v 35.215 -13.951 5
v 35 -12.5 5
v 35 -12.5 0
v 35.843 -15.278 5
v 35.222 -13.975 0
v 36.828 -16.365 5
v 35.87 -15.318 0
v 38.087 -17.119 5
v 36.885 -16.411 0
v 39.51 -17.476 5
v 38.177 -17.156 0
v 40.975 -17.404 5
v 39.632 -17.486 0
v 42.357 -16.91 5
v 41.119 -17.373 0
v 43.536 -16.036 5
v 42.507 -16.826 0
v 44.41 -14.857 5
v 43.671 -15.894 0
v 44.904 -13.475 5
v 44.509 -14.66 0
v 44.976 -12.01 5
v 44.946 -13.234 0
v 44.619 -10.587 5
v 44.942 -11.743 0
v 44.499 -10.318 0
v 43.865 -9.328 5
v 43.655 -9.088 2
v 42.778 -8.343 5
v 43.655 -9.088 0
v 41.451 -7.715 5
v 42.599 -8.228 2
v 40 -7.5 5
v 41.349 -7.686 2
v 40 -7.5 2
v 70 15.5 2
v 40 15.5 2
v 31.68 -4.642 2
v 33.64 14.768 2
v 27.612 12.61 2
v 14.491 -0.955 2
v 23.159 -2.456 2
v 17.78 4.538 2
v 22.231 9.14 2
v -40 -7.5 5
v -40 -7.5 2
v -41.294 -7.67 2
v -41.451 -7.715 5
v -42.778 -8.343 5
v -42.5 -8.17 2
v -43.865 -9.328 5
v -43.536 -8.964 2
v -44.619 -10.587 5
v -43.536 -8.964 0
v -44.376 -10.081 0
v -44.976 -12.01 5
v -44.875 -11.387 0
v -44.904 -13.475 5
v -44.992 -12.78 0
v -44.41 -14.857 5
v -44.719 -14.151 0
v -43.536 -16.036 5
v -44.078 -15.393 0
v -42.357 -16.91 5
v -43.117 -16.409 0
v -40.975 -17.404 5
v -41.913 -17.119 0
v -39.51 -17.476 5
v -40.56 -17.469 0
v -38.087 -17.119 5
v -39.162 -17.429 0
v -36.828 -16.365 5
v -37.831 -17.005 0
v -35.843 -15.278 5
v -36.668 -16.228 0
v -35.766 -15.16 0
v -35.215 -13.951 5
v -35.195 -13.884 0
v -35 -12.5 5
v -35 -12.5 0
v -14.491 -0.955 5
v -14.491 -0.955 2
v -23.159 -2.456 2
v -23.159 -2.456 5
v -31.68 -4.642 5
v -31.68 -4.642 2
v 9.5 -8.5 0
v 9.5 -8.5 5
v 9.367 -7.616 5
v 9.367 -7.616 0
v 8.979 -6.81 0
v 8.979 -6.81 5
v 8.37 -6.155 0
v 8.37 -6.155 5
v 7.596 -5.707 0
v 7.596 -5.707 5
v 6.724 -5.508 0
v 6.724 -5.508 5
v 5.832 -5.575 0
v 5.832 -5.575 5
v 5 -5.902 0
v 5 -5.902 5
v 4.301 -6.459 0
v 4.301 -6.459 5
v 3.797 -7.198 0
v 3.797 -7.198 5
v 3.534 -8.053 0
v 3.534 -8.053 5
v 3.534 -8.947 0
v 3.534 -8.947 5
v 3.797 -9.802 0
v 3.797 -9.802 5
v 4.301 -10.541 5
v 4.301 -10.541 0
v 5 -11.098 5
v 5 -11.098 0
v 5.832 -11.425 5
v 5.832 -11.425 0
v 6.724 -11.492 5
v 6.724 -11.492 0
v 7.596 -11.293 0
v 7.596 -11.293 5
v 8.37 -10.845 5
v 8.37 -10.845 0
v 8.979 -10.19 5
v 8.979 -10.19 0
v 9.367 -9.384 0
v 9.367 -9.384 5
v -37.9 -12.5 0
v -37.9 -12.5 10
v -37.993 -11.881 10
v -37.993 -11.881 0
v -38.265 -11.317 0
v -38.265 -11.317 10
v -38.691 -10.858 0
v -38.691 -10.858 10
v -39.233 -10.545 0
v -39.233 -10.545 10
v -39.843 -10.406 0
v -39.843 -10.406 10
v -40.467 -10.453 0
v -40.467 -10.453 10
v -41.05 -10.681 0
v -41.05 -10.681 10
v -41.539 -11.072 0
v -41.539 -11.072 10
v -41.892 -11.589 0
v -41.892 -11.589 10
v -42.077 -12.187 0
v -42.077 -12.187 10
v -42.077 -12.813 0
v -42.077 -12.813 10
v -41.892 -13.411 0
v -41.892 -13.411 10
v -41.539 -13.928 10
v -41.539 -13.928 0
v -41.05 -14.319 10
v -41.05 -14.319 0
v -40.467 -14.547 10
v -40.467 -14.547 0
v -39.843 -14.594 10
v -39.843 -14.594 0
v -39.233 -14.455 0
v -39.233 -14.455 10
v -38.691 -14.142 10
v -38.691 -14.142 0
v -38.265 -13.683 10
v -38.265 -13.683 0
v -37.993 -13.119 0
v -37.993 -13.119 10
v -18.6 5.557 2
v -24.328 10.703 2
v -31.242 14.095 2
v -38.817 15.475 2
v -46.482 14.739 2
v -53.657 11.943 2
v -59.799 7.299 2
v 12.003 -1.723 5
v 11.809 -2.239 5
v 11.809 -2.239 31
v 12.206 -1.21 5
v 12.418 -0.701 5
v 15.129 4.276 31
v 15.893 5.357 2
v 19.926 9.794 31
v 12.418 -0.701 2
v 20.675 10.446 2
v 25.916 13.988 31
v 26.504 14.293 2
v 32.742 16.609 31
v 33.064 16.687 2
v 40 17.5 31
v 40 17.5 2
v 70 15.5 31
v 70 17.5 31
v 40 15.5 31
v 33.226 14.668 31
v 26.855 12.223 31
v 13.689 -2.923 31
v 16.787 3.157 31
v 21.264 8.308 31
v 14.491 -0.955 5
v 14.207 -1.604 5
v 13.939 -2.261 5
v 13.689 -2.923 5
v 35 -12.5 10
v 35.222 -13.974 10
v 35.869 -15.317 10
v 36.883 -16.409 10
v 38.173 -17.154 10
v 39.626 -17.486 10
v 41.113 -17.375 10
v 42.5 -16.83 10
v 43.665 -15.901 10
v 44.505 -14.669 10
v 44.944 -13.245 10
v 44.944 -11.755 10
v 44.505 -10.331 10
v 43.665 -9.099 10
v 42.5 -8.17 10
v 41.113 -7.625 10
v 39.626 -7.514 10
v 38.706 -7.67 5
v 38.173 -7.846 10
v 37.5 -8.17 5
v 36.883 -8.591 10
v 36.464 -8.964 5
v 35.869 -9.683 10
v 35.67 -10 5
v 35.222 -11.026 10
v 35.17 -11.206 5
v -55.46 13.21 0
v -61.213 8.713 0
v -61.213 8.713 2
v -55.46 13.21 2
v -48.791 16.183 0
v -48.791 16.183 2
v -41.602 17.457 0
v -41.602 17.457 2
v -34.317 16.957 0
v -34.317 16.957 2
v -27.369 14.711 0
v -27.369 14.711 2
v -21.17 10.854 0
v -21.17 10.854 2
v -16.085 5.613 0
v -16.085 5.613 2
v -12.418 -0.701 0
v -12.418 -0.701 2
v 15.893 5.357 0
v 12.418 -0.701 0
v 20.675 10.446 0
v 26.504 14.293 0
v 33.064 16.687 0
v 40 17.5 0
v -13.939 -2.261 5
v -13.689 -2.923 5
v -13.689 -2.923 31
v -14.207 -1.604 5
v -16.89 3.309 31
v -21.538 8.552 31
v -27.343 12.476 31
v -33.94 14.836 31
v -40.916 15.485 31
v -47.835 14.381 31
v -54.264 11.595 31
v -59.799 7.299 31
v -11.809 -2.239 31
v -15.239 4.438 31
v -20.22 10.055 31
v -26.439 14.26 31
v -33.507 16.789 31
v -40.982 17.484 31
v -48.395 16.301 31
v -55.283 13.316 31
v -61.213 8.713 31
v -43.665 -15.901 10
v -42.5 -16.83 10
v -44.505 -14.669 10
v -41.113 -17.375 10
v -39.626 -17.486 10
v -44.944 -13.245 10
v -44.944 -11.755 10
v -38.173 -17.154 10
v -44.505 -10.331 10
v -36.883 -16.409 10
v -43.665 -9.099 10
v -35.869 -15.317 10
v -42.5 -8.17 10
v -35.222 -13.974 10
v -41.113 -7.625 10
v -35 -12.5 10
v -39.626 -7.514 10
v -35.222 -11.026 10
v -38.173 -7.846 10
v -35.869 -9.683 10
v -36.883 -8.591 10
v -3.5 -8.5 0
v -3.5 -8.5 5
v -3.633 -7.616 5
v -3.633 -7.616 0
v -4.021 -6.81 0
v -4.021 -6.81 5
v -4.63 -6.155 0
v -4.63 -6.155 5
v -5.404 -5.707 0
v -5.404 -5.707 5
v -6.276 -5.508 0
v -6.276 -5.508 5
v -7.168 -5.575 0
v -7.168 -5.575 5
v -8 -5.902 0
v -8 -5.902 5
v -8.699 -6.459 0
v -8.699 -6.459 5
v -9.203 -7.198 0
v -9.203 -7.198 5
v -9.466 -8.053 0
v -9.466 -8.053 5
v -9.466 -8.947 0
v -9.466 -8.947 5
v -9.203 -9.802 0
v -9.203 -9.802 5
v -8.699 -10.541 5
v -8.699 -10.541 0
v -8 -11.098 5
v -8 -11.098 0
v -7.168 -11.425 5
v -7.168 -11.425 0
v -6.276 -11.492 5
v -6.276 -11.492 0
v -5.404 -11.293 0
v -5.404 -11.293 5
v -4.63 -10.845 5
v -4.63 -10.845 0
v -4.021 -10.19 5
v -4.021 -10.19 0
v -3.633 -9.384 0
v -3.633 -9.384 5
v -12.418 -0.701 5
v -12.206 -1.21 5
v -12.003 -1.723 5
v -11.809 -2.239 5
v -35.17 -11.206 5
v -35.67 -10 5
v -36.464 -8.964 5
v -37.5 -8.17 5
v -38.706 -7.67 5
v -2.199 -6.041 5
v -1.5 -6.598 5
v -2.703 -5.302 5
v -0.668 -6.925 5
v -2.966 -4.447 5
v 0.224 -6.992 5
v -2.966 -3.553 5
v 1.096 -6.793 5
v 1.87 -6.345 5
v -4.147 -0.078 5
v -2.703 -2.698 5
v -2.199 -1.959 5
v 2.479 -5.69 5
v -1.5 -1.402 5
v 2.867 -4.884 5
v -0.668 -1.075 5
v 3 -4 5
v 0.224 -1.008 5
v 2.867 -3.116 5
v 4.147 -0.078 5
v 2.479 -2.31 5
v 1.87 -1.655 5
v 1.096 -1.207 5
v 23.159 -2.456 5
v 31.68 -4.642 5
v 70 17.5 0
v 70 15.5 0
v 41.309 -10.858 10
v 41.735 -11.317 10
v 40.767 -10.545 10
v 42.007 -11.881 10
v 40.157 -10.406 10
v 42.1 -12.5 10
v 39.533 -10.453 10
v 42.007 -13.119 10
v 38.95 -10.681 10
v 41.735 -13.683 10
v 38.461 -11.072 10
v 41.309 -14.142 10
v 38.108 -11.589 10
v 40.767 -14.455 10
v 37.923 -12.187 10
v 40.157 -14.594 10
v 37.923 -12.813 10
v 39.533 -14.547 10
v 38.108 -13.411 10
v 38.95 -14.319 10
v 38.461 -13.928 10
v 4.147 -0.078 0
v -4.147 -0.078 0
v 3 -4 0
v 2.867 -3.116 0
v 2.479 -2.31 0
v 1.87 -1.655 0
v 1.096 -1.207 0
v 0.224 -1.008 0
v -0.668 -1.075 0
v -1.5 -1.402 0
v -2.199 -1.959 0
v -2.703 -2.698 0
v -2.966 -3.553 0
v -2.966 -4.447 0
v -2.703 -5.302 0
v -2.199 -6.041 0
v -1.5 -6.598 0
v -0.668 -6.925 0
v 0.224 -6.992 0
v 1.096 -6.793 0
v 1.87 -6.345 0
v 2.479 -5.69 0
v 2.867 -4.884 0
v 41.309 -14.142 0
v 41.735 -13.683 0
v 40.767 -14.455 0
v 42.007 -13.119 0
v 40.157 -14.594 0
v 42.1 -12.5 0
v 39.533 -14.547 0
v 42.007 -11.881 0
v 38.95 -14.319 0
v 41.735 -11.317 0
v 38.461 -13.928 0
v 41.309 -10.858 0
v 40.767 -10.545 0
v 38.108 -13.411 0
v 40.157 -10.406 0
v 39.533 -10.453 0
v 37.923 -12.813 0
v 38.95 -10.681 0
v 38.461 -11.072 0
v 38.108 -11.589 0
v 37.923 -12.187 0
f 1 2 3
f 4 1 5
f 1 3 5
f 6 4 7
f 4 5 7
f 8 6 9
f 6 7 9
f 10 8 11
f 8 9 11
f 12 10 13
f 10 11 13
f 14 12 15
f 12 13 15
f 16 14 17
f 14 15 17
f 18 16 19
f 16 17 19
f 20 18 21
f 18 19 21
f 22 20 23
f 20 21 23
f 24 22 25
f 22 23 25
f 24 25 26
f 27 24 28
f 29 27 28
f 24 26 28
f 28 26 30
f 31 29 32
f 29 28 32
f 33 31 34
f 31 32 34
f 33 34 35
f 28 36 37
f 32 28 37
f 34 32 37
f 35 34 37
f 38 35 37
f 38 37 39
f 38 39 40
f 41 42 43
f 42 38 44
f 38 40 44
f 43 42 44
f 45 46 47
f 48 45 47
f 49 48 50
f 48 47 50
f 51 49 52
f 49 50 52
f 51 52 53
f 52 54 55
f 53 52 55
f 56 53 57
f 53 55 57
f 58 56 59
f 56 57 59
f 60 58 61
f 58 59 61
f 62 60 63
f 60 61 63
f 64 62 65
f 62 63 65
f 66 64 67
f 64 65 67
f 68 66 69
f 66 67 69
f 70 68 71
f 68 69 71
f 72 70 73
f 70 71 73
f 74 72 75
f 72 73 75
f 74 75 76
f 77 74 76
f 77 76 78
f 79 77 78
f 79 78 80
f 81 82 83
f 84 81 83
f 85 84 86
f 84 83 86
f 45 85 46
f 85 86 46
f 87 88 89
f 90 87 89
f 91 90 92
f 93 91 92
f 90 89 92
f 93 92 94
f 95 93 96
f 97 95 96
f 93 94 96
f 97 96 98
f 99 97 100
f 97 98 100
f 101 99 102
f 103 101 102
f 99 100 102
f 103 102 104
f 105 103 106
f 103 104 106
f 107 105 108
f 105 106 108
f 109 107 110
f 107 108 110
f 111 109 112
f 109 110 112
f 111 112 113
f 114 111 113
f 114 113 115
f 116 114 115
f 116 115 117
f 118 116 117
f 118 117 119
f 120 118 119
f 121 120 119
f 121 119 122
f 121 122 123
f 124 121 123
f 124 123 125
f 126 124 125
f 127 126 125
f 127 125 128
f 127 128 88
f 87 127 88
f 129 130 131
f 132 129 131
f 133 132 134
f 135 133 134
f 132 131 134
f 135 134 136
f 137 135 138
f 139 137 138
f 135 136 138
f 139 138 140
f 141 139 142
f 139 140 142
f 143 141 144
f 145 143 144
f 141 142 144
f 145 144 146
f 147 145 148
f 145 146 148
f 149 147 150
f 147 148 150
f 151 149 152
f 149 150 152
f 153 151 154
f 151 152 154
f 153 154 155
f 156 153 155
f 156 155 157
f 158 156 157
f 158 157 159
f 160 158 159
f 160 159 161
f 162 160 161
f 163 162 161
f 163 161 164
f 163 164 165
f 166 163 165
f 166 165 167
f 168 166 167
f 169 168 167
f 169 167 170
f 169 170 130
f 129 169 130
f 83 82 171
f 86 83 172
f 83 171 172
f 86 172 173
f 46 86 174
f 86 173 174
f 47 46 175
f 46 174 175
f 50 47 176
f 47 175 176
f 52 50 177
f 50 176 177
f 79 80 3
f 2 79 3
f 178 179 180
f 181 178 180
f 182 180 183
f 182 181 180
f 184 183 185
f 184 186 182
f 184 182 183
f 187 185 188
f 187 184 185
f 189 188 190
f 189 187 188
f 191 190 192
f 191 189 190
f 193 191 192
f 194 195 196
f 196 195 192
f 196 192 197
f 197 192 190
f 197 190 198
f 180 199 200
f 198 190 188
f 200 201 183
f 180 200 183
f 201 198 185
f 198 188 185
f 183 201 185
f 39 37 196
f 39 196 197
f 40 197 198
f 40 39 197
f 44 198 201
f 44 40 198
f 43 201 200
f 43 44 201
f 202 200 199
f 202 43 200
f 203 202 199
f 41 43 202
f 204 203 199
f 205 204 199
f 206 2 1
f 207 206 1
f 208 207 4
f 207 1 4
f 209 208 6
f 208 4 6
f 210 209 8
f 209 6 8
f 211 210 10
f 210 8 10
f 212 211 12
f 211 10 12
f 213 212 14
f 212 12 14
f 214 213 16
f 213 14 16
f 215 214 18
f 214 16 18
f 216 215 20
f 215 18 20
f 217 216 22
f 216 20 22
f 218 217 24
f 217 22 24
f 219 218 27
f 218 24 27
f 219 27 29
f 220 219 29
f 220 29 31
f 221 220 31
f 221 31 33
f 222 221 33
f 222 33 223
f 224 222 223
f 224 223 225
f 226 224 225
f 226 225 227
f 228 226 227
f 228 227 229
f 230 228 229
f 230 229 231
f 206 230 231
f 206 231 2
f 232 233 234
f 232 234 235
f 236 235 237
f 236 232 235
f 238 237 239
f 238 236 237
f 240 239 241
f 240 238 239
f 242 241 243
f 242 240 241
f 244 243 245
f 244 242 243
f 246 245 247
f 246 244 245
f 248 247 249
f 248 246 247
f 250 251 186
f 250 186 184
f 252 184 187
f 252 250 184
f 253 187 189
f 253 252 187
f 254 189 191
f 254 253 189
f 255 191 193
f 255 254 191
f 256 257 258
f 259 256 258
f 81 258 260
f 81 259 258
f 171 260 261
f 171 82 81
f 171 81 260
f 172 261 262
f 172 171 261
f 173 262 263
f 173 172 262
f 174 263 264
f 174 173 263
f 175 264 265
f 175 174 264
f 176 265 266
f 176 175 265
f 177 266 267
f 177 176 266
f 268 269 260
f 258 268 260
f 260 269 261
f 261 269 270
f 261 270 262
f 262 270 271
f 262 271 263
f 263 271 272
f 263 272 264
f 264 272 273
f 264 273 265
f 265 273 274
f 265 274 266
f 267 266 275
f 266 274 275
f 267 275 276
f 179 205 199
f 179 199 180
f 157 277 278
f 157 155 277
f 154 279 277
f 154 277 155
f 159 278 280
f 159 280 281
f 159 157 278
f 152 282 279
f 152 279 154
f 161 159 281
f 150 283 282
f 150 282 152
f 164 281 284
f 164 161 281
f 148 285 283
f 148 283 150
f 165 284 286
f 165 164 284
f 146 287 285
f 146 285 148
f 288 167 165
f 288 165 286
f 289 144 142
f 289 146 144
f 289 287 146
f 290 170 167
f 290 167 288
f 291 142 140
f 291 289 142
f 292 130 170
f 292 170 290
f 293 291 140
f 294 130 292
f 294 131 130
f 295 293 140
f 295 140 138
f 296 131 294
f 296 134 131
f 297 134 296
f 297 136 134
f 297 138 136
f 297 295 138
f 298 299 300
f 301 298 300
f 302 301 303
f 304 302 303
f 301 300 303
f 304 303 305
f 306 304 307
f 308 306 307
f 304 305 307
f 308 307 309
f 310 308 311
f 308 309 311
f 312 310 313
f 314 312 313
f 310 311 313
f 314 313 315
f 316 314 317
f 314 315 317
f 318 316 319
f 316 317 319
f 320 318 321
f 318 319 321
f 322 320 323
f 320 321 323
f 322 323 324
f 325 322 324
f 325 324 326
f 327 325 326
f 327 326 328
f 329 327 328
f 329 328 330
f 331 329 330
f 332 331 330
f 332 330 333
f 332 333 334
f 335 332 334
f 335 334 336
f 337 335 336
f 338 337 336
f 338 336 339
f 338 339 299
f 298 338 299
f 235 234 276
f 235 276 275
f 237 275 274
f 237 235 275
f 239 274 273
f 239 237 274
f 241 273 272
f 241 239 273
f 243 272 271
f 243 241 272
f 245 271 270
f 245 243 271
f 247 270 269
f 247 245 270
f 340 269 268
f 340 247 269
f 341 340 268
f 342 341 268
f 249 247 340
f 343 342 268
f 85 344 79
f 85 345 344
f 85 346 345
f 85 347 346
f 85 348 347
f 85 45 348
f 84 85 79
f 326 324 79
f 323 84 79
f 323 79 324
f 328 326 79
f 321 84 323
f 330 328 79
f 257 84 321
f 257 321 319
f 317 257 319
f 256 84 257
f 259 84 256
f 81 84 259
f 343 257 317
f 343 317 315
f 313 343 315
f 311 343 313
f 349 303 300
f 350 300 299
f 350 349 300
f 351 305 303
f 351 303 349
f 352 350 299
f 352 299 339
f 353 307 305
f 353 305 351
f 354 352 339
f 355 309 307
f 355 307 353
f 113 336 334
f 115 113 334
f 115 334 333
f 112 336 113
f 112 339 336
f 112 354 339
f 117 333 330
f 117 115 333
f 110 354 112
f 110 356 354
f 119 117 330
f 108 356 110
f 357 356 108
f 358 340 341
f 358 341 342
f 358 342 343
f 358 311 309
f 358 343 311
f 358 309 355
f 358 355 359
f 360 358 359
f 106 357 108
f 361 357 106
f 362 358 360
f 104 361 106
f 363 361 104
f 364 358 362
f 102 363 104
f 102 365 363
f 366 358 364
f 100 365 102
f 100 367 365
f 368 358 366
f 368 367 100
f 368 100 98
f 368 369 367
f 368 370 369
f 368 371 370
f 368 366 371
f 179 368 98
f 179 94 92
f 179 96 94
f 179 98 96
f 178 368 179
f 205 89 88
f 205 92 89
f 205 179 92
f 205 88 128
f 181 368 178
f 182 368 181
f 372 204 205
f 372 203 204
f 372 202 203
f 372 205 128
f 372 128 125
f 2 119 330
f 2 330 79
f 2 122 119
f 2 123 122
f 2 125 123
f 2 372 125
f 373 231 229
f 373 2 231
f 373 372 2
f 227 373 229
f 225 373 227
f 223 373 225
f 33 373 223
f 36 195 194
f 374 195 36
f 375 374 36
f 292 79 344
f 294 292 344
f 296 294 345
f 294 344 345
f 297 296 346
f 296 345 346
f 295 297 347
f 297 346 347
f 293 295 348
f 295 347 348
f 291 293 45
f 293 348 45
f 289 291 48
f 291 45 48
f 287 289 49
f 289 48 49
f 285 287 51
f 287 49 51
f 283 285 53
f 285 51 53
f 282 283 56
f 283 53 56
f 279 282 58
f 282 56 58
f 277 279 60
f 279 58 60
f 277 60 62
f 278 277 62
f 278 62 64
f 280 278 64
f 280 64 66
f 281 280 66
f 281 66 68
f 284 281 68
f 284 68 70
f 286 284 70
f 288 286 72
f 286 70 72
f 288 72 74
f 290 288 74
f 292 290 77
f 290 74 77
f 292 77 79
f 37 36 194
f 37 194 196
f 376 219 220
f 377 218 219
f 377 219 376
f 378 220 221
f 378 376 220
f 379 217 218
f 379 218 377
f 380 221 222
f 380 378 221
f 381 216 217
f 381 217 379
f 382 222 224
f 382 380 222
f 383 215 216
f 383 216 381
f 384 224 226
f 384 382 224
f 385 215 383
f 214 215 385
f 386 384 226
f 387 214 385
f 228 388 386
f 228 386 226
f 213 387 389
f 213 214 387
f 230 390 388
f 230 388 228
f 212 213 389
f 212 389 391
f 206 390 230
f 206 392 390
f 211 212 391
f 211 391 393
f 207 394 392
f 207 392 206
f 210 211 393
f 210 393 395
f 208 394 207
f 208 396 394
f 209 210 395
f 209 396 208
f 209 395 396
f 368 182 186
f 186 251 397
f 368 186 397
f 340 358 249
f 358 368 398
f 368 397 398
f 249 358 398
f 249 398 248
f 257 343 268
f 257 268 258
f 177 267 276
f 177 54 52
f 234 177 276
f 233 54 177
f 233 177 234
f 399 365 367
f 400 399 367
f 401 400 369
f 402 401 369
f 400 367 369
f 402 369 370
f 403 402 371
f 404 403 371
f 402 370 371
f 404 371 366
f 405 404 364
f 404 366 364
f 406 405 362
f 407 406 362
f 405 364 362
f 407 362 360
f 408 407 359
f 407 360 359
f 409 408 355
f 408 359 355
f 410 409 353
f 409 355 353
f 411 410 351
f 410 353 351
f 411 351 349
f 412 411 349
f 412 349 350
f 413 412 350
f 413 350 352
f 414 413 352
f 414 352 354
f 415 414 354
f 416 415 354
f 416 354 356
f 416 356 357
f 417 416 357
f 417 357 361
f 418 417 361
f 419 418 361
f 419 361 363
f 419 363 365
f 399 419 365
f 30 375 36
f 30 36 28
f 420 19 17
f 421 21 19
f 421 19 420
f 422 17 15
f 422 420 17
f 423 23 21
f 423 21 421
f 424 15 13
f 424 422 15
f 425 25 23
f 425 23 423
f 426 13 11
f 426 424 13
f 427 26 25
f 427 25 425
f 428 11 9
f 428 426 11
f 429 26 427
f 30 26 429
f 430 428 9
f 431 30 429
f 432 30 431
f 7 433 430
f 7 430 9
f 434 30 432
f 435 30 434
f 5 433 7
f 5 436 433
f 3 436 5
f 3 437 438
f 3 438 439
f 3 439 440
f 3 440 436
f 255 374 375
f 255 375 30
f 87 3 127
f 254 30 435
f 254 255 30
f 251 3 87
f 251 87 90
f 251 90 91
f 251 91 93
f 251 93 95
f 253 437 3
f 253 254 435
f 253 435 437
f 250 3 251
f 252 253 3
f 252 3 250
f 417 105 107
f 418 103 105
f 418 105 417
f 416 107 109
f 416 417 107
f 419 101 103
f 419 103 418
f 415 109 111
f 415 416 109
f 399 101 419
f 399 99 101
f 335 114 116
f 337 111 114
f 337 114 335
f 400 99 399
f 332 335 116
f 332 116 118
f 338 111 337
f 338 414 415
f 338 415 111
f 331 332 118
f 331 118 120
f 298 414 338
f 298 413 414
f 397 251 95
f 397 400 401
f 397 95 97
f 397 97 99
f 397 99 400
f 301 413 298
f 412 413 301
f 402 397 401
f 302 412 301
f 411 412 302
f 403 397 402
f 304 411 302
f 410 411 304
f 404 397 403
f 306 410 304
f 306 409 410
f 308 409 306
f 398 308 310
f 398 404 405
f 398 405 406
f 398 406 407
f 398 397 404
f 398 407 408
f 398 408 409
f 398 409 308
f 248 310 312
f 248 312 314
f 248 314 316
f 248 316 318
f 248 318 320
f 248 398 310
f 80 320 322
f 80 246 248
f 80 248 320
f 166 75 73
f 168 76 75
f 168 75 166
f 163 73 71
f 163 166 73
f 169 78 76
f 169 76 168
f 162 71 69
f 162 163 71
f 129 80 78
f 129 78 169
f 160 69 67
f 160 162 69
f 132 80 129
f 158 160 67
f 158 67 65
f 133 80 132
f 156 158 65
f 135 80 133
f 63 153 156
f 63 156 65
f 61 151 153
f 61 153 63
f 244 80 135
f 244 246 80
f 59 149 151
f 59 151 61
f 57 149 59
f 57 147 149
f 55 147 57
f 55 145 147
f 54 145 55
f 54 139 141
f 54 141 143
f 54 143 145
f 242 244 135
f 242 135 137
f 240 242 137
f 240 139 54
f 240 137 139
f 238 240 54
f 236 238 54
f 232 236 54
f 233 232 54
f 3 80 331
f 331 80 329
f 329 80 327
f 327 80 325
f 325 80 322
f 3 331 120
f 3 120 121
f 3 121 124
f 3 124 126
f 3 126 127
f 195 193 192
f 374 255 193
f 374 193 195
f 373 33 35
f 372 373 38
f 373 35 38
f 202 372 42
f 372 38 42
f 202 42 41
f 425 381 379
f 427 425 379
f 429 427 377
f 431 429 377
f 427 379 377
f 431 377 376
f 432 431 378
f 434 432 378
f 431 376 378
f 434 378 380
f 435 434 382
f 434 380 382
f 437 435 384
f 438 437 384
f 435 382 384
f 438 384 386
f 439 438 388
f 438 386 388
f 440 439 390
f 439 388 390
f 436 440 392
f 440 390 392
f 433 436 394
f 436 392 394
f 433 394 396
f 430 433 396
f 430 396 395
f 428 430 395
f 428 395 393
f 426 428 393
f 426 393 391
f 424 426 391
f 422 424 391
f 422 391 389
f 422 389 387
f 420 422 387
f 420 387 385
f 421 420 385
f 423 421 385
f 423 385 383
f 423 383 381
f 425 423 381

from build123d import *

# Parameters (mm, degrees)
BOSS_EXTRUDE1_DEPTH = 5
SKETCH3_R           = 5
BOSS_EXTRUDE2_DEPTH = 5
BOSS_EXTRUDE3_DEPTH = 2
BOSS_EXTRUDE5_DEPTH = 29
SKETCH6_R           = 2.1
SKETCH6_R_2         = 3
CUT_EXTRUDE1_DEPTH  = 11


with BuildPart() as part:
    # Sketch2 → Boss-Extrude1 (new body)
    with BuildSketch(Plane.XY):
        with BuildLine():
            Line((-35, -12.5), (35, -12.5))
            ThreePointArc((35, -12.5), (43.535533906, -16.035533906), (40, -7.5))
            ThreePointArc((40, -7.5), (0, 0), (-40, -7.5))
            ThreePointArc((-40, -7.5), (-43.535533906, -16.035533906), (-35, -12.5))
        make_face()
    extrude(amount=BOSS_EXTRUDE1_DEPTH)

    # Sketch3 → Boss-Extrude2 (add)
    with BuildSketch(Plane.XY.offset(5)):
        with Locations((-40, -12.5)):
            Circle(SKETCH3_R)
        with Locations(Location((40, -12.5, 0), (0, 0, 180))):  # turned: the seam where the file's is
            Circle(SKETCH3_R)
    extrude(amount=BOSS_EXTRUDE2_DEPTH)

    # Sketch4 → Boss-Extrude3 (add)
    with BuildSketch(Plane(origin=(0, 0, 0), x_dir=(-1, 0, 0), z_dir=(0, 0, -1))):
        with BuildLine():
            Line((-40, 17.5), (-70, 17.5))
            Line((-70, 17.5), (-70, 15.5))
            Line((-70, 15.5), (-43.655276341, -9.088408748))
            ThreePointArc((-43.655276341, -9.088408748), (-41.992742299, -7.914263622), (-40, -7.5))
            ThreePointArc((-40, -7.5), (-26.428535361, -3.209517668), (-12.417905405, -0.700506038))
            ThreePointArc((-12.417905405, -0.700506038), (-23.477058659, 12.539816482), (-40, 17.5))
        make_face()
        with BuildLine():
            ThreePointArc((61.213203436, 8.713203436), (34.317115595, 16.95682985), (12.417905405, -0.700506038))
            ThreePointArc((12.417905405, -0.700506038), (26.428535361, -3.209517668), (40, -7.5))
            ThreePointArc((40, -7.5), (41.913417162, -7.880602337), (43.535533906, -8.964466094))
            Line((43.535533906, -8.964466094), (61.213203436, 8.713203436))
        make_face()
    extrude(amount=-BOSS_EXTRUDE3_DEPTH)

    # Sketch5 → Boss-Extrude5 (add)
    with BuildSketch(Plane.XY.offset(2)):
        with BuildLine():
            Line((-59.798989873, 7.298989873), (-61.213203436, 8.713203436))
            ThreePointArc((-61.213203436, 8.713203436), (-33.506811582, 16.788880214), (-11.809221376, -2.2393957))
            Line((-11.809221376, -2.2393957), (-13.688606618, -2.923435987))
            ThreePointArc((-13.688606618, -2.923435987), (-33.93969081, 14.836288199), (-59.798989873, 7.298989873))
        make_face()
        with BuildLine():
            Line((40, 17.5), (70, 17.5))
            Line((70, 17.5), (70, 15.5))
            Line((70, 15.5), (40, 15.5))
            ThreePointArc((40, 15.5), (23.939859782, 10.43625724), (13.688606618, -2.923435987))
            Line((13.688606618, -2.923435987), (11.809221376, -2.2393957))
            ThreePointArc((11.809221376, -2.2393957), (22.792706909, 12.074561329), (40, 17.5))
        make_face()
    extrude(amount=BOSS_EXTRUDE5_DEPTH)

    # Sketch6 → Cut-Extrude1 (cut, through all)
    with BuildSketch(Plane.XY.offset(10)):
        with Locations((-40, -12.5)):
            Circle(SKETCH6_R)
        with Locations((40, -12.5)):
            Circle(SKETCH6_R)
        with Locations((0, -4)):
            Circle(SKETCH6_R_2)
        with Locations((-6.5, -8.5)):
            Circle(SKETCH6_R_2)
        with Locations((6.5, -8.5)):
            Circle(SKETCH6_R_2)
    extrude(amount=-CUT_EXTRUDE1_DEPTH, mode=Mode.SUBTRACT)


solid = part.part
